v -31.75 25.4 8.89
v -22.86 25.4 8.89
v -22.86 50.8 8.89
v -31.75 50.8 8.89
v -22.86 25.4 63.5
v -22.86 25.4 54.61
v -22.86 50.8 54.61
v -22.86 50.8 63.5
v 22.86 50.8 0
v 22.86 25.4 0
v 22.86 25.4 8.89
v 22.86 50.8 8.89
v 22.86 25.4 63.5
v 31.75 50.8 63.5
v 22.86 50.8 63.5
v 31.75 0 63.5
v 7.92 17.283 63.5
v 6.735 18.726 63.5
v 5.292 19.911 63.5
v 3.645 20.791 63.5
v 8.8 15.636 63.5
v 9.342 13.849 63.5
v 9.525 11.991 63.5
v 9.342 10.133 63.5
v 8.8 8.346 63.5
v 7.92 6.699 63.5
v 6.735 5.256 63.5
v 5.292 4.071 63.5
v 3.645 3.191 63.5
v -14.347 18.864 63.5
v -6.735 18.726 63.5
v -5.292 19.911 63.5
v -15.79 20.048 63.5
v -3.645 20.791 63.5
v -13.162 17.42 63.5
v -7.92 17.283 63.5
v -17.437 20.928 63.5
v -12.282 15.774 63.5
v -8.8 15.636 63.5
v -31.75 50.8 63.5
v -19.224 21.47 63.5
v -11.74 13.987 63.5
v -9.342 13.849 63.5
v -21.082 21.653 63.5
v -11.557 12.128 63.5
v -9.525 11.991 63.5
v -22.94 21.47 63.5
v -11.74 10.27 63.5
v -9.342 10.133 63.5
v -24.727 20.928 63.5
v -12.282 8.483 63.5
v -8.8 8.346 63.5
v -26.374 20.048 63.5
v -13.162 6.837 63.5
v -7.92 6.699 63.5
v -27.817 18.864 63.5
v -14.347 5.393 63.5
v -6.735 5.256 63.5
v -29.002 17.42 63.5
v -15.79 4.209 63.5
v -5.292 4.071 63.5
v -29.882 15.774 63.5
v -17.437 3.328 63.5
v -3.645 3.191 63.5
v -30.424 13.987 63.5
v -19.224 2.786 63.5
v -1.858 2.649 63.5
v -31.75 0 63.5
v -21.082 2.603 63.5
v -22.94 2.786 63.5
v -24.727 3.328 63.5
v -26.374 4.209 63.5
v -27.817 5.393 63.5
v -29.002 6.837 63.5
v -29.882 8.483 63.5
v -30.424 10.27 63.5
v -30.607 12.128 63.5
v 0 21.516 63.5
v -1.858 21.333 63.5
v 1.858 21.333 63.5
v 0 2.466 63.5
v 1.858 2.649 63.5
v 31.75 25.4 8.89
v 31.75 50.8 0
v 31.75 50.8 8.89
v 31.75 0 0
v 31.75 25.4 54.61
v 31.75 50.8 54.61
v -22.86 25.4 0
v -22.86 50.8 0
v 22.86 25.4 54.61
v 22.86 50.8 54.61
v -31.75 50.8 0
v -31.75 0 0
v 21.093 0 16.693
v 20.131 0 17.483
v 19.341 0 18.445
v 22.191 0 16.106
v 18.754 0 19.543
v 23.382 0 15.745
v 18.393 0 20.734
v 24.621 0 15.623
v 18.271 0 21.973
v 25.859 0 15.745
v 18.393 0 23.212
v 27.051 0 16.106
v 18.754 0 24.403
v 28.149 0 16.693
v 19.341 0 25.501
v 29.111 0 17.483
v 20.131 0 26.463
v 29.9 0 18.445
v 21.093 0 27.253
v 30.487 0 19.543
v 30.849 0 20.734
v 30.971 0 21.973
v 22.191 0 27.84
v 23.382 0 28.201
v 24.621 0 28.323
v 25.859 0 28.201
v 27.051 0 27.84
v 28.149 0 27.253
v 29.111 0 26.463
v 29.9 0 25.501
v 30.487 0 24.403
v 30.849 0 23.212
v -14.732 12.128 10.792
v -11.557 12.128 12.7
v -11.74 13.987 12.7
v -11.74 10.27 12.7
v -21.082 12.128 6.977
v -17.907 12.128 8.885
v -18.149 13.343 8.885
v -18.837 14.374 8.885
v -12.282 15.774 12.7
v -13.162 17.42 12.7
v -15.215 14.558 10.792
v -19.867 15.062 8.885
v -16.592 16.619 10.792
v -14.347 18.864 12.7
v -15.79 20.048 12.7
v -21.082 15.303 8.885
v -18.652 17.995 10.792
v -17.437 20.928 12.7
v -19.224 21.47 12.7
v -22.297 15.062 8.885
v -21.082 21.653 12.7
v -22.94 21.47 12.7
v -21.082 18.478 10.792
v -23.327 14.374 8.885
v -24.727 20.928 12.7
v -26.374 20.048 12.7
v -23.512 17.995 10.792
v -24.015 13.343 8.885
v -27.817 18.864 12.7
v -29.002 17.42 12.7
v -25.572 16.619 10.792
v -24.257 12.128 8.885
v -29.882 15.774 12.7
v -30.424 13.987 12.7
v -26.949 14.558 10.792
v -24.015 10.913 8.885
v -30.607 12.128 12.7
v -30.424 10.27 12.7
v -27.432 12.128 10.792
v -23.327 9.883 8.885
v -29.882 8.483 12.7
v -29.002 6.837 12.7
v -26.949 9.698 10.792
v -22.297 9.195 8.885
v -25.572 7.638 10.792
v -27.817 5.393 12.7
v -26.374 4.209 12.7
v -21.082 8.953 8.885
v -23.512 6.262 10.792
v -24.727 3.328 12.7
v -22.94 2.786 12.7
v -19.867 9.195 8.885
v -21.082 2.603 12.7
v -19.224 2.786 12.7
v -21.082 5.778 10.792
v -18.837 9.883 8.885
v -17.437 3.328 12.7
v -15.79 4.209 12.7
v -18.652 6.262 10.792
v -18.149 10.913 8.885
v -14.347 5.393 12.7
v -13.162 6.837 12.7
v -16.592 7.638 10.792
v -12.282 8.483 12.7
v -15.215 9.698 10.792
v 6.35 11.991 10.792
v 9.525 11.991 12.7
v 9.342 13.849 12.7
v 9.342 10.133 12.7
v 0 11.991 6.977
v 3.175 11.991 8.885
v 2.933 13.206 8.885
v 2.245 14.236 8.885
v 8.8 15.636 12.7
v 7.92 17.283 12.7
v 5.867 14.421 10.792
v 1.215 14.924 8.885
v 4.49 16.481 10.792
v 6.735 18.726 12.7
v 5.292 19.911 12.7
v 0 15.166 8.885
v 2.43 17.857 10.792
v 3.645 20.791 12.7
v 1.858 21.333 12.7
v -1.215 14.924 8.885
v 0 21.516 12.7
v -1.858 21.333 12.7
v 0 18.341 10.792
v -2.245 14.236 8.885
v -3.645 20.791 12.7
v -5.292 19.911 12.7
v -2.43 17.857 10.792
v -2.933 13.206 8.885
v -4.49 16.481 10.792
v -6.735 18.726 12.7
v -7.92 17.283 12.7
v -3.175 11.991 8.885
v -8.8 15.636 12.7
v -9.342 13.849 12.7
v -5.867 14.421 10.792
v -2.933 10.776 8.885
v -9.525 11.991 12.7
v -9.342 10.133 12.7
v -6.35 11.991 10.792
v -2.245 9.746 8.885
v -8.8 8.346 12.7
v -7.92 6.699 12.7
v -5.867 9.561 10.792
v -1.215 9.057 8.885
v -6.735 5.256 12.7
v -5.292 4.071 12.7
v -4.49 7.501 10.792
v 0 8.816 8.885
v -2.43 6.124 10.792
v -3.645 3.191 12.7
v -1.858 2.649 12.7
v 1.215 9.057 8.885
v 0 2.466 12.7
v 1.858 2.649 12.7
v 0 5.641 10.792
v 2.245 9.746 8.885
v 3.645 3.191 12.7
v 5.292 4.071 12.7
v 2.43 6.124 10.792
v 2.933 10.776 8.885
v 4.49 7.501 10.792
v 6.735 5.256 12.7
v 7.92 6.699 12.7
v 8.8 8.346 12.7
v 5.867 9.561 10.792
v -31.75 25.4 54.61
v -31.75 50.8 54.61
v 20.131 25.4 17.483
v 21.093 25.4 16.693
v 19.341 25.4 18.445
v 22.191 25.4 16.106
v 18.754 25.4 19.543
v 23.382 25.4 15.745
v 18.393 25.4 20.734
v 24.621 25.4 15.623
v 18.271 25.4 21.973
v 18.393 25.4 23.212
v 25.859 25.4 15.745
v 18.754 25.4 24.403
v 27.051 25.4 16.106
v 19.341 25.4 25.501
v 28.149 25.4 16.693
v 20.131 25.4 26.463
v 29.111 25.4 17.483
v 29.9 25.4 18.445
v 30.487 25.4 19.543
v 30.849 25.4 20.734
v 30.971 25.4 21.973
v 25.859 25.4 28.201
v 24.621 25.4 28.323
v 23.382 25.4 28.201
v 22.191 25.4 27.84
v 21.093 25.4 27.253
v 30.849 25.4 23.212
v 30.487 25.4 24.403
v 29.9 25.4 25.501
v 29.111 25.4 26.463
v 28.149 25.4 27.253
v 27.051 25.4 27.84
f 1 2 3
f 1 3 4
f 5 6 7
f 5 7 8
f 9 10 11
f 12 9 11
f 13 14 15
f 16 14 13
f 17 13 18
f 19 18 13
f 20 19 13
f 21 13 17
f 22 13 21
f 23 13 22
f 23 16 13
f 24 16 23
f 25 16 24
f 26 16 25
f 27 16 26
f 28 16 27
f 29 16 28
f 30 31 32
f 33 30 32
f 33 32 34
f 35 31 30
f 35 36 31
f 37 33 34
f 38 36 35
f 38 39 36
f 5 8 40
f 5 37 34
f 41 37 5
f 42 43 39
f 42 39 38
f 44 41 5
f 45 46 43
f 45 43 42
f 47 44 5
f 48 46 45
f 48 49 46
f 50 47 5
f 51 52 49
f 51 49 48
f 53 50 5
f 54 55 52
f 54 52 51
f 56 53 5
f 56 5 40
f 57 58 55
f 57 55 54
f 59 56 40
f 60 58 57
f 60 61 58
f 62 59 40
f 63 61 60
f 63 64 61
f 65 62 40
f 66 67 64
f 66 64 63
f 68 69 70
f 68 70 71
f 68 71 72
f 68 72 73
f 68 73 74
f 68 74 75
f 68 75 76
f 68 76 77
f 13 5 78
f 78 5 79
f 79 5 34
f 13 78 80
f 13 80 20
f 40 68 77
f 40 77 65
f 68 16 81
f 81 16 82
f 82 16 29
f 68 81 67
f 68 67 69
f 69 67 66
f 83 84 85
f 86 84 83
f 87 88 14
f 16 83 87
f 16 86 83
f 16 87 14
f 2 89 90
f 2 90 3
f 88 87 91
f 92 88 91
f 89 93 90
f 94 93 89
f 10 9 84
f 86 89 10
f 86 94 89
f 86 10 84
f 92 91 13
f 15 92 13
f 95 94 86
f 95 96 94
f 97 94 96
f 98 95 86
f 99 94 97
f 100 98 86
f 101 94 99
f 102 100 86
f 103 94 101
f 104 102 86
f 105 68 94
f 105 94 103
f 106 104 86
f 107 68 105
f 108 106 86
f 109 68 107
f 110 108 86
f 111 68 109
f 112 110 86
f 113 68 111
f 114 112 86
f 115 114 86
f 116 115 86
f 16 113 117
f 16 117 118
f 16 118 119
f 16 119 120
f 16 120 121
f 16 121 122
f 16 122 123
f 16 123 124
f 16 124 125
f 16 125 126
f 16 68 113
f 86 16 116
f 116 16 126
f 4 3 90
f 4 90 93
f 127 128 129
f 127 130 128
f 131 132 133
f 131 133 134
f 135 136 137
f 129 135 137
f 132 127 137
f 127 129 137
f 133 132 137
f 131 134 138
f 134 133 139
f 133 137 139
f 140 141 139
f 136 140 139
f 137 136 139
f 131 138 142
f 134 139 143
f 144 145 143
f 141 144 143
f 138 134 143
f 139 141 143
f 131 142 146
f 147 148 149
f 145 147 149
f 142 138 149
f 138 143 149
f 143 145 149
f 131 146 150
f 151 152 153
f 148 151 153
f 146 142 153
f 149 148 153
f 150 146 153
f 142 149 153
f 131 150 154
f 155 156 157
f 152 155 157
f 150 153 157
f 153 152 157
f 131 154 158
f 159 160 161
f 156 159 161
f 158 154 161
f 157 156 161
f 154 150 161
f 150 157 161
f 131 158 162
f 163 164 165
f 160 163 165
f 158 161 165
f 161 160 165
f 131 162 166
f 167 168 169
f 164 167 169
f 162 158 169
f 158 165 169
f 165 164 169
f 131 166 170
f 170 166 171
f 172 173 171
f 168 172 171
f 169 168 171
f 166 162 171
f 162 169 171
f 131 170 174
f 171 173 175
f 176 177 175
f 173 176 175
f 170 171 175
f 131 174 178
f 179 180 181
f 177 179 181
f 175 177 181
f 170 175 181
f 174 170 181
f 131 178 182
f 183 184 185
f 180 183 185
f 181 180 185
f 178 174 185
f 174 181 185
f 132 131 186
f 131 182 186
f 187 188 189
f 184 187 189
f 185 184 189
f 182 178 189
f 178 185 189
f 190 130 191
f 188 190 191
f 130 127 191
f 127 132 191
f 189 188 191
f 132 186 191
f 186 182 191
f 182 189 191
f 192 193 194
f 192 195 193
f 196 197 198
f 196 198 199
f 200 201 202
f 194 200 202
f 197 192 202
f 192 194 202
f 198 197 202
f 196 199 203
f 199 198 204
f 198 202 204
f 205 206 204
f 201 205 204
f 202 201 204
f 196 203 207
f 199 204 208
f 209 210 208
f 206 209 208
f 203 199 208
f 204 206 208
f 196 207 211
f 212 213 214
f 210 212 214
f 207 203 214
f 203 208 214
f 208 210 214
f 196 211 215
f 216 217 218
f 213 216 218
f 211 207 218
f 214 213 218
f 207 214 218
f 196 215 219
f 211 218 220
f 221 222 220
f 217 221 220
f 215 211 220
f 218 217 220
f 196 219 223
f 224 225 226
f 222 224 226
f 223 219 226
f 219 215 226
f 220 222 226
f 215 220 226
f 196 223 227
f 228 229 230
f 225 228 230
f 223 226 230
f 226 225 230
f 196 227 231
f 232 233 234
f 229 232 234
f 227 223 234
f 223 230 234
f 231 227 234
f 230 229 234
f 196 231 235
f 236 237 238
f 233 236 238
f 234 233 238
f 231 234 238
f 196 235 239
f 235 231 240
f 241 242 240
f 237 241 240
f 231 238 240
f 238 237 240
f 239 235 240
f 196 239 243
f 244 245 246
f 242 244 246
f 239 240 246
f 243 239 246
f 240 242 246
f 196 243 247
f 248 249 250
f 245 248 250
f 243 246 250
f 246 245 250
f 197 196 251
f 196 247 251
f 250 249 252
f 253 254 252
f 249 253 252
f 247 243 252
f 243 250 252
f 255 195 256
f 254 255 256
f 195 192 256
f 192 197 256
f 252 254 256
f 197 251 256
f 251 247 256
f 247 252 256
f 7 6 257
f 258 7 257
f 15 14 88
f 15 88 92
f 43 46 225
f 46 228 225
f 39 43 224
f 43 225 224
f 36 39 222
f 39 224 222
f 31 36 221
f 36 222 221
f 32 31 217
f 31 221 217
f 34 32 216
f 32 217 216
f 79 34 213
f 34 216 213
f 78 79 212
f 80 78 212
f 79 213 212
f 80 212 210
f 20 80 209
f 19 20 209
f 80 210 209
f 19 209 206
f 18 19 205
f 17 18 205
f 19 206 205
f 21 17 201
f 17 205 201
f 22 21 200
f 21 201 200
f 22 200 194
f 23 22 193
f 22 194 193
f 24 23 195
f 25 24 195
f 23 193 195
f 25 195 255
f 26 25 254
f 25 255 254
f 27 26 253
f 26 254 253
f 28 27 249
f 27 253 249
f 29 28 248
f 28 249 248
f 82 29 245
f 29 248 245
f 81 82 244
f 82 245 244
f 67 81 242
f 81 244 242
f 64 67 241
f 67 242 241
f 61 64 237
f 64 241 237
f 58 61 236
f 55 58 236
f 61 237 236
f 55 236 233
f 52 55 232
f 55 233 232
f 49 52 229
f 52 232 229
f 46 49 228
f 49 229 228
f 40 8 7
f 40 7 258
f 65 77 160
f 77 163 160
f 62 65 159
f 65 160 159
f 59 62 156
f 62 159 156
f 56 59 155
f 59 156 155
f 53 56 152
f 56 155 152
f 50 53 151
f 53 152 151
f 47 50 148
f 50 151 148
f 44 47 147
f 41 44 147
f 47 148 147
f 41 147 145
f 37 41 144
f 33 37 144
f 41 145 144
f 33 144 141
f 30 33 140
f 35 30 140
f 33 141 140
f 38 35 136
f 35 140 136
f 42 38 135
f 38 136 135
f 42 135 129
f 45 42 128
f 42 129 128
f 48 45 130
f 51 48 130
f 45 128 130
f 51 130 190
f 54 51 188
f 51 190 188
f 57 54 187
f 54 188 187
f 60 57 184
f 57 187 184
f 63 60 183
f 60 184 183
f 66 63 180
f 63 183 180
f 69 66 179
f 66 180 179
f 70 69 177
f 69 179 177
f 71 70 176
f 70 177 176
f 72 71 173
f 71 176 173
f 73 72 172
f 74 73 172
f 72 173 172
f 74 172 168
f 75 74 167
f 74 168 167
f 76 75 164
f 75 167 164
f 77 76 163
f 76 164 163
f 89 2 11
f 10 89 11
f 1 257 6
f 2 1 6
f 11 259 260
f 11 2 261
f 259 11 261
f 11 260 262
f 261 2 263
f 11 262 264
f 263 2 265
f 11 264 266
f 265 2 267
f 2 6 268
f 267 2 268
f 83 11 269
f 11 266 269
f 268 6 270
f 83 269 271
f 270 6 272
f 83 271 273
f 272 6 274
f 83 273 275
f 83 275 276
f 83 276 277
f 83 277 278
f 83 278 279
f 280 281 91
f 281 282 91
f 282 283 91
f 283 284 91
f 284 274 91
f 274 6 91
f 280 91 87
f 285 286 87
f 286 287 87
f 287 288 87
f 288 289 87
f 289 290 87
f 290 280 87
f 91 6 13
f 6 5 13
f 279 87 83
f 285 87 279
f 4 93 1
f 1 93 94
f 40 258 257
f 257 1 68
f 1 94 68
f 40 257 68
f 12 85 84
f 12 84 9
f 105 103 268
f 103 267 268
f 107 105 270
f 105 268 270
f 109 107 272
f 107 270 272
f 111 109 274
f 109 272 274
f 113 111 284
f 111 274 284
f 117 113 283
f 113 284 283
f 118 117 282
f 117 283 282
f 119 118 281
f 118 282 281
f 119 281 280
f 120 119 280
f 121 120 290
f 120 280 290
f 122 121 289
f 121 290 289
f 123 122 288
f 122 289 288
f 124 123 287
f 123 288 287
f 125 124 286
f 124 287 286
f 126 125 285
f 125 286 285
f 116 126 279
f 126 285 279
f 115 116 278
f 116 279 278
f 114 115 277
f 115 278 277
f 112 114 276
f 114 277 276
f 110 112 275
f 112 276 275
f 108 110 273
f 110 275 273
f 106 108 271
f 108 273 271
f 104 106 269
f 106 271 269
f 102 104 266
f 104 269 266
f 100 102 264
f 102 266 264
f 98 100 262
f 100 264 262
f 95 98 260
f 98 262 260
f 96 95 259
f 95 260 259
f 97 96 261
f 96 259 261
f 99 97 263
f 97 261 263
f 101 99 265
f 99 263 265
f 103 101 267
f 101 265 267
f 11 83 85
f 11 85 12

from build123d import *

# Parameters (mm, degrees)
F0_W     = 31.75
F0_H     = 63.5
F1_DEPTH = 25.4
F4_D     = 12.7
F4_DEPTH = 25.4
F4_TIP   = 3.8154649308
F5_W     = 8.89
F5_H     = 8.89
F6_DEPTH = 25.4
F7_D     = 19.05
F7_DEPTH = 50.8
F7_TIP   = 5.7231973962


# Not quite as in the source:
# - a feature names something its author has since deleted; it is built from what else it names


with BuildPart() as f1:
    # F0 (on Front) → F1 (new body)
    with BuildSketch(Plane.XZ):
        with Locations((15.875, 31.75)):
            Rectangle(F0_W, F0_H)
        with Locations((-15.875, 31.75)):
            Rectangle(F0_W, F0_H)
    extrude(amount=-F1_DEPTH)

    # F4
    with Locations(Plane.XZ):
        with Locations((24.6206466109, 21.9729263335)):
            Hole(F4_D / 2, depth=F4_DEPTH)
            with Locations((0, 0, -(F4_DEPTH + F4_TIP / 2))):  # 118° drill point
                Cone(0, F4_D / 2, F4_TIP, mode=Mode.SUBTRACT)

    # F5 (on face) → F6 (join)
    with BuildSketch(Plane(origin=(0, 25.4, 0), x_dir=(-1, 0, 0), z_dir=(0, 1, 0))):
        with Locations((-27.305, 59.055)):
            Rectangle(F5_W, F5_H)
        with Locations((27.305, 59.055)):
            Rectangle(F5_W, F5_H)
        with Locations((-27.305, 4.445)):
            Rectangle(F5_W, F5_H)
        with Locations((27.305, 4.445)):
            Rectangle(F5_W, F5_H)
    extrude(amount=F6_DEPTH)

    # F7
    with Locations(Plane.XY.offset(63.5)):
        with Locations((-21.082, 12.1284499764), (0, 11.9907837361)):
            Hole(F7_D / 2, depth=F7_DEPTH)
            with Locations((0, 0, -(F7_DEPTH + F7_TIP / 2))):  # 118° drill point
                Cone(0, F7_D / 2, F7_TIP, mode=Mode.SUBTRACT)


solid = f1.part
